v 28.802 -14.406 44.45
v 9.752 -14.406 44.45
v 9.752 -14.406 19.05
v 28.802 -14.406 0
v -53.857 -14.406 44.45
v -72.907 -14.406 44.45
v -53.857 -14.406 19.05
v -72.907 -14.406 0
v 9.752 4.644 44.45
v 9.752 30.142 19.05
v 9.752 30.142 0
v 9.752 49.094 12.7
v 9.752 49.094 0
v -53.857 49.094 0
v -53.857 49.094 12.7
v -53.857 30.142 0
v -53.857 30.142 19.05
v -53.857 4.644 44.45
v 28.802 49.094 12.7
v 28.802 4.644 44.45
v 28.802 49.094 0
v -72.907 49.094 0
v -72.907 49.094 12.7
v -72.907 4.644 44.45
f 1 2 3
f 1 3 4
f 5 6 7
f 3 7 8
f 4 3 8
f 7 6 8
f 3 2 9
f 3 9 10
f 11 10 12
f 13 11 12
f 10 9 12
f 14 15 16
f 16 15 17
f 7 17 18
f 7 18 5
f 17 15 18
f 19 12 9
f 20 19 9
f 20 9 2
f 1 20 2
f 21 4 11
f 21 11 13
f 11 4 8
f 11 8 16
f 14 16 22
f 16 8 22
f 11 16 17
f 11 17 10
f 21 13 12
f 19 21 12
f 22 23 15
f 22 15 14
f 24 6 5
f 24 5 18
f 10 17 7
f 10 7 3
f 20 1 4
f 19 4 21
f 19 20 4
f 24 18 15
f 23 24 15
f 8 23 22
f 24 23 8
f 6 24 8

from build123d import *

# Parameters (mm, degrees)
F0_W     = 63.609058
F0_H     = 44.548504
F1_DEPTH = 19.05
F3_DEPTH = 19.05
F4_W     = 44.548504
F4_H     = 19.05
F5_DEPTH = 19.05


with BuildPart() as f1:
    # F0 (on Top) → F1 (new body)
    with BuildSketch(Plane.XY):
        with Locations((-22.052619, 7.86802)):
            Rectangle(F0_W, F0_H)
    extrude(amount=F1_DEPTH)

    # F2 (on face) → F3 (join)
    with BuildSketch(Plane(origin=(-53.857148, 0, 0), x_dir=(0, -1, 0), z_dir=(-1, 0, 0))):
        Polygon((-49.093768, 0), (14.406232, 0), (14.406232, 44.45), (-4.643768, 44.45), (-49.093768, 12.700002), align=None)
    extrude(amount=F3_DEPTH)

    # F4 (on face) → F5 (join)
    with BuildSketch(Plane.YZ.offset(9.75191)):
        Polygon((-14.406232, 44.45), (-14.406232, 19.05), (30.142272, 19.05), (30.142272, 0), (49.093768, 0), (49.093768, 12.7), (4.643768, 44.45), align=None)
        with Locations((7.86802, 9.525)):
            Rectangle(F4_W, F4_H)
    extrude(amount=F5_DEPTH)


solid = f1.part
